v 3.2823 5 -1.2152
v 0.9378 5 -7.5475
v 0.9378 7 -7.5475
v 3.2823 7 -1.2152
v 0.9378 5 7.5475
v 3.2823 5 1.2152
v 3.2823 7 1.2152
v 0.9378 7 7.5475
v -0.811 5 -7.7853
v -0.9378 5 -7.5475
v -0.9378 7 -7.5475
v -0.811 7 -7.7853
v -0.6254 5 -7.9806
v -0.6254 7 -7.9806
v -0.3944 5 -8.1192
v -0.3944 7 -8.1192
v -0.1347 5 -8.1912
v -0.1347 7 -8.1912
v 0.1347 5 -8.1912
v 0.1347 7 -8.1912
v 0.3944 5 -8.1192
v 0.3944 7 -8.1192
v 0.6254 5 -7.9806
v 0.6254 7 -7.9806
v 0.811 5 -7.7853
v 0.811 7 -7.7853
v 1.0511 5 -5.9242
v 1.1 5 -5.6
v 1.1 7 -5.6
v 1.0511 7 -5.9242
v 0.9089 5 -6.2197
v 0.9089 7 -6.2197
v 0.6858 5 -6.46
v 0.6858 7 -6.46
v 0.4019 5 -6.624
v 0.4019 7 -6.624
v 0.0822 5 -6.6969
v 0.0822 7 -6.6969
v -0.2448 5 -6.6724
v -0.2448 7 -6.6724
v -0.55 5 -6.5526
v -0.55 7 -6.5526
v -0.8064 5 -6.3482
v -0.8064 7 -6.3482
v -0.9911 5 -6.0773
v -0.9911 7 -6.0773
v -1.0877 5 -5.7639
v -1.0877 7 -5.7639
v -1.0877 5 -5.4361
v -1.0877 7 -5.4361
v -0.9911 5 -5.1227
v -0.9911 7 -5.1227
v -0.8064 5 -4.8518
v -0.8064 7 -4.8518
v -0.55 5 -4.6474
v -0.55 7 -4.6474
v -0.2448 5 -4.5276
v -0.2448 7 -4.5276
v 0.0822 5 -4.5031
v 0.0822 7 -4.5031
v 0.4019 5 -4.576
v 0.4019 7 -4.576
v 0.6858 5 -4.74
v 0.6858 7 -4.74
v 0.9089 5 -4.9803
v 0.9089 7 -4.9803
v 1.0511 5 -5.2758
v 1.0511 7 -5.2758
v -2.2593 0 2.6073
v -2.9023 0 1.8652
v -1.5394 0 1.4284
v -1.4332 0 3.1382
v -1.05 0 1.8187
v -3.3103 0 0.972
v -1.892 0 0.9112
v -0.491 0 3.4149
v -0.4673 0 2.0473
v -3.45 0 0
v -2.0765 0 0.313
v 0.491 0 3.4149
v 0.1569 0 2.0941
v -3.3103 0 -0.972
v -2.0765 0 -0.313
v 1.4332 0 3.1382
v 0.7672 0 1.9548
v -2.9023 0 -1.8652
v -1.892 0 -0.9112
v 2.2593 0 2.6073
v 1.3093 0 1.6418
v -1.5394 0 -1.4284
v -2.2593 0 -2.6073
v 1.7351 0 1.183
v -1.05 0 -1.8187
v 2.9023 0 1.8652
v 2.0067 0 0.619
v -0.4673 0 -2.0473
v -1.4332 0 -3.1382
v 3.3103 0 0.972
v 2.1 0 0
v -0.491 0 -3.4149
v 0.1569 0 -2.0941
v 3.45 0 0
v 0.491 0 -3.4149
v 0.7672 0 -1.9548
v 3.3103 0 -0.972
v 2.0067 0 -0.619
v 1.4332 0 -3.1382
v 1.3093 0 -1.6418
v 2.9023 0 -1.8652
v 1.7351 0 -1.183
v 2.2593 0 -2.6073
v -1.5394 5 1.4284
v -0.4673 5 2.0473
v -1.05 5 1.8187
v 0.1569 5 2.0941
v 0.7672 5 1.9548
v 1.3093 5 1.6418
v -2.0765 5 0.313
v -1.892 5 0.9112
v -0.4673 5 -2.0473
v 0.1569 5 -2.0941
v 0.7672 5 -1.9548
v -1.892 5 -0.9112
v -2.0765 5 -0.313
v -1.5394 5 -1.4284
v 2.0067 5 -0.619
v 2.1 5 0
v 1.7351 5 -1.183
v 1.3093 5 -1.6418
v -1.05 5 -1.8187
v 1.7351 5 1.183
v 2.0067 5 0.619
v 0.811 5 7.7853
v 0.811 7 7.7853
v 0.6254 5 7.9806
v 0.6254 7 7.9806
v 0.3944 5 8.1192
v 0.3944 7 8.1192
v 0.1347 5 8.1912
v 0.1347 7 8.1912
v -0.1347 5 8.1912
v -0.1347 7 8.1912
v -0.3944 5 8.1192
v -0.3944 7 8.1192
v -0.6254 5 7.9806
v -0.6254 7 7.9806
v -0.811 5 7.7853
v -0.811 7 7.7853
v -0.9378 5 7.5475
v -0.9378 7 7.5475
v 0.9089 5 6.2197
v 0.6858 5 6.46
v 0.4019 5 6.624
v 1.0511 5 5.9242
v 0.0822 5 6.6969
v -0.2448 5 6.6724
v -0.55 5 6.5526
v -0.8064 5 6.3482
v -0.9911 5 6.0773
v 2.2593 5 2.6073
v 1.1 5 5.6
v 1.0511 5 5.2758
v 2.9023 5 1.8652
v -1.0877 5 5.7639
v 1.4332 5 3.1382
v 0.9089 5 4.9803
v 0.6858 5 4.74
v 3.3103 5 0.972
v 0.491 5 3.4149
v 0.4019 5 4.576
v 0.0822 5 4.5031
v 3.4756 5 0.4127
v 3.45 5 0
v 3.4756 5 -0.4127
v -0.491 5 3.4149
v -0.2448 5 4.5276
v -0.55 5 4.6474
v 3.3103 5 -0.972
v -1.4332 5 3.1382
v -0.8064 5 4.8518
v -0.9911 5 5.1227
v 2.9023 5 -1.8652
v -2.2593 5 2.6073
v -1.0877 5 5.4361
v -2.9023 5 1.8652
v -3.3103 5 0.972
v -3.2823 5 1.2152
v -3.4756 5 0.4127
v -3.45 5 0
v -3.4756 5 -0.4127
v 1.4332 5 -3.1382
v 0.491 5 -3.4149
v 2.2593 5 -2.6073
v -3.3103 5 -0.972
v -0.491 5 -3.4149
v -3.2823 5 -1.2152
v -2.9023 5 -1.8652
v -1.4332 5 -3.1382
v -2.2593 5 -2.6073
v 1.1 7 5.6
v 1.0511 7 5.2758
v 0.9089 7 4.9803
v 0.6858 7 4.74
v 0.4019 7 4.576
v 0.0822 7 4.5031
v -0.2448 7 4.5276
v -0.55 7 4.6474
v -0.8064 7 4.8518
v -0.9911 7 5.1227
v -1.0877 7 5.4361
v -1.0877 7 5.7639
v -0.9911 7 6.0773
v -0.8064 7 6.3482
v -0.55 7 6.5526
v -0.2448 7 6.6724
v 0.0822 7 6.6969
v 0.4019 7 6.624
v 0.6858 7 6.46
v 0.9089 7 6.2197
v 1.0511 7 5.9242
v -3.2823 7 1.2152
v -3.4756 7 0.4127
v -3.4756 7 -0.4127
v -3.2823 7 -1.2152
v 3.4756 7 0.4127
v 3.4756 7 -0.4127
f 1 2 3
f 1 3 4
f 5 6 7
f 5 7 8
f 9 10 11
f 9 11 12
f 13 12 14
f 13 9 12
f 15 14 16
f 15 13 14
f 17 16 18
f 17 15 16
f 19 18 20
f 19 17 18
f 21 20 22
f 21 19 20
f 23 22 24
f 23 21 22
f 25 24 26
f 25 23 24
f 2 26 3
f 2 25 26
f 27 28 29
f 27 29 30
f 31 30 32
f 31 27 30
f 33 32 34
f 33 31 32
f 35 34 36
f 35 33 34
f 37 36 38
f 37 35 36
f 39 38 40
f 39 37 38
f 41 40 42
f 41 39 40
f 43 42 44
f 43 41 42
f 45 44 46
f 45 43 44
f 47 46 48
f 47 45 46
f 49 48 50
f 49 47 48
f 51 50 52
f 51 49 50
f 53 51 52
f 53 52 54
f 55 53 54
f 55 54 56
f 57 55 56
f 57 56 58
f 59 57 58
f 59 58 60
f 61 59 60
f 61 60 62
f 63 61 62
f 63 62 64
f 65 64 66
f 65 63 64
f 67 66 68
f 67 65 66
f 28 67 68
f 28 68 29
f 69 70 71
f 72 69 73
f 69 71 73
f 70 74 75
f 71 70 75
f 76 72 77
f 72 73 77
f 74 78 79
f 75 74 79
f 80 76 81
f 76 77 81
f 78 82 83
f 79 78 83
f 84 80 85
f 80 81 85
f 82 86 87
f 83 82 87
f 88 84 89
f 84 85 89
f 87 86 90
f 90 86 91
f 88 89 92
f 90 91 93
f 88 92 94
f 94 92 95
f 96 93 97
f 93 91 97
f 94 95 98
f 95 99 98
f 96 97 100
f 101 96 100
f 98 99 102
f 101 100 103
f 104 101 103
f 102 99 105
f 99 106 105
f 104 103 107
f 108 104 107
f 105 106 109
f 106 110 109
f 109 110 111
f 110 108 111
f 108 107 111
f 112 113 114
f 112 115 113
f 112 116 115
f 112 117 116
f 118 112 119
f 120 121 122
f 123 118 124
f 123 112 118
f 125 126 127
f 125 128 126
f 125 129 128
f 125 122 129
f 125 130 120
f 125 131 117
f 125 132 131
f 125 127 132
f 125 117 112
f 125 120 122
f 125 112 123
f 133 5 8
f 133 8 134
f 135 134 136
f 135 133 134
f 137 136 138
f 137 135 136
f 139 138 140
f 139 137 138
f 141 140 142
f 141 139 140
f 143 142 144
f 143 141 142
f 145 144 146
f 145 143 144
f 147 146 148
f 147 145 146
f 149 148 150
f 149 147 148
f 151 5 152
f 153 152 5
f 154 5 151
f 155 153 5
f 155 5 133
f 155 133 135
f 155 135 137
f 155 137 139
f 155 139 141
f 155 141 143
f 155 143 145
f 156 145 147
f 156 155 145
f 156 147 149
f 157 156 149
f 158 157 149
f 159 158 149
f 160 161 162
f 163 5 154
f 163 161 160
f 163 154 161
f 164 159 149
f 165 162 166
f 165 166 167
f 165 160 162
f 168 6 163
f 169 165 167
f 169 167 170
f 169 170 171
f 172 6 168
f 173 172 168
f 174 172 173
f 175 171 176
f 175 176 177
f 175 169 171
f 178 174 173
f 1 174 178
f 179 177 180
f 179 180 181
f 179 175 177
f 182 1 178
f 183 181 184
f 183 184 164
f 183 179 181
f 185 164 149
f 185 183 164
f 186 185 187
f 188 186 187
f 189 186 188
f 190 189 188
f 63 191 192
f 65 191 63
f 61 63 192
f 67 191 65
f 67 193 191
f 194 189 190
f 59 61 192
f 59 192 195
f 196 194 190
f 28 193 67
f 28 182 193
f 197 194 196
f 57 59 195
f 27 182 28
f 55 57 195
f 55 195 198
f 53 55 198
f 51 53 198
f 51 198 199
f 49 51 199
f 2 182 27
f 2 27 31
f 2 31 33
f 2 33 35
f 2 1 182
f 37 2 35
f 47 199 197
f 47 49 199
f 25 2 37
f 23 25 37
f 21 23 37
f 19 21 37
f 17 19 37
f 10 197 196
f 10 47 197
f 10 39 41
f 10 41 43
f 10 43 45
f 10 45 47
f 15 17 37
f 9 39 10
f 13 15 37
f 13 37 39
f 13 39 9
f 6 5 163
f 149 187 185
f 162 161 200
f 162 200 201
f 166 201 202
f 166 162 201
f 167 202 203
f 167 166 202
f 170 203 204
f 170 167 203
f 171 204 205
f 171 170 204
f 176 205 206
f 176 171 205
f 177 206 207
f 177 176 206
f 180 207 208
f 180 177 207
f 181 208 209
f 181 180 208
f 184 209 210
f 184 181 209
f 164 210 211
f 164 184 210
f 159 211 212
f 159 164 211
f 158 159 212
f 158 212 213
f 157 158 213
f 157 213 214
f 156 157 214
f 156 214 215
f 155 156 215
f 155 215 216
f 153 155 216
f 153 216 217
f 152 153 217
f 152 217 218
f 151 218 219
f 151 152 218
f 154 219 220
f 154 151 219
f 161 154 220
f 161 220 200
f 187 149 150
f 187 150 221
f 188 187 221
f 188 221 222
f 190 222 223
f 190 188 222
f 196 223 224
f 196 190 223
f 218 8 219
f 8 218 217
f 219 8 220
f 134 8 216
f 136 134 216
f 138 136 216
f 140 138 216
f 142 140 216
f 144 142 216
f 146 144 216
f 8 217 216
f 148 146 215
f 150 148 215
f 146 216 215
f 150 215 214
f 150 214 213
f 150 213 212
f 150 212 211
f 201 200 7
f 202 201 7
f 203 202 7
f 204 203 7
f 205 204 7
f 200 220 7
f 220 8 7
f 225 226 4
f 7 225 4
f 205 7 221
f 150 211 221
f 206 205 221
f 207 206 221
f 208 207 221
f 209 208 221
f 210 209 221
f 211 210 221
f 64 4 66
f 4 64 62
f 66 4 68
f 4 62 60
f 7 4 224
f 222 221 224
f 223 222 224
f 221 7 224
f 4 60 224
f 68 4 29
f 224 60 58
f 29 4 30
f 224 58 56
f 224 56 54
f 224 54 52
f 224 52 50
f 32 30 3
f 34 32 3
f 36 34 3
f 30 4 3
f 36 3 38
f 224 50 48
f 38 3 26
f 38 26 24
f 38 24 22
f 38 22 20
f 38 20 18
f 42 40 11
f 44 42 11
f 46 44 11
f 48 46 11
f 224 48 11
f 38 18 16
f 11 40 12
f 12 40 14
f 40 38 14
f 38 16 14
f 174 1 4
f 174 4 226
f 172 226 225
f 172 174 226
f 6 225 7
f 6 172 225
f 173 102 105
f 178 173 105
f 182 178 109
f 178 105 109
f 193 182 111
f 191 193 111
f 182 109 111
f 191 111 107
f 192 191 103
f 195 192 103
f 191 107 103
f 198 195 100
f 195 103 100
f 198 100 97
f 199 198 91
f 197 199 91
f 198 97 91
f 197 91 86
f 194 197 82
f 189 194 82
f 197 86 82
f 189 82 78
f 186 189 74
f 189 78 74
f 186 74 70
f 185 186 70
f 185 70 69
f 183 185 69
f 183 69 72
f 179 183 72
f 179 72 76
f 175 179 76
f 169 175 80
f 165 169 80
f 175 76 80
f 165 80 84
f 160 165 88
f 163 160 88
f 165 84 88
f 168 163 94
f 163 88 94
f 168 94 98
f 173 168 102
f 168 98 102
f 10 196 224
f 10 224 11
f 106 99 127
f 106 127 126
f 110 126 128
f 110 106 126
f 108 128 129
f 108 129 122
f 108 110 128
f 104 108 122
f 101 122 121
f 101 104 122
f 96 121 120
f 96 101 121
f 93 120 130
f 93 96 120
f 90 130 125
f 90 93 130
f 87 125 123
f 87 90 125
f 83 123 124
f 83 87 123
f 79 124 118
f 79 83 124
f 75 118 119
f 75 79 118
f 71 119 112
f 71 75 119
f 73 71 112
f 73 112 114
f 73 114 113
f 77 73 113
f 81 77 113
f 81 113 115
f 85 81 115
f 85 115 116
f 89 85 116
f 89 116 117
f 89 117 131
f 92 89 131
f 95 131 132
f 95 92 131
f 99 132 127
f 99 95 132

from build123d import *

# Parameters (mm, degrees)
SKETCH1_R           = 3.45
SKETCH1_R_2         = 2.1
BOSS_EXTRUDE1_DEPTH = 5
SKETCH2_R           = 1.1
BOSS_EXTRUDE2_DEPTH = 2


with BuildPart() as part:
    # Sketch1 → Boss-Extrude1 (new body)
    with BuildSketch(Plane(origin=(0, 0, 0), x_dir=(1, 0, 0), z_dir=(0, 1, 0))):
        Circle(SKETCH1_R)
        Circle(SKETCH1_R_2, mode=Mode.SUBTRACT)
    extrude(amount=BOSS_EXTRUDE1_DEPTH)

    # Sketch2 → Boss-Extrude2 (add)
    with BuildSketch(Plane(origin=(0, 5, 0), x_dir=(1, 0, 0), z_dir=(0, 1, 0))):
        with BuildLine():
            Line((-3.282257873, 1.215229712), (-0.937787964, 7.547493269))
            ThreePointArc((-0.937787964, 7.547493269), (0, 8.200284779), (0.937787964, 7.547493269))
            Line((0.937787964, 7.547493269), (3.282257873, 1.215229712))
            ThreePointArc((3.282257873, 1.215229712), (3.5, 0), (3.282257873, -1.215229712))
            Line((3.282257873, -1.215229712), (0.937787964, -7.547493269))
            ThreePointArc((0.937787964, -7.547493269), (0, -8.200284779), (-0.937787964, -7.547493269))
            Line((-0.937787964, -7.547493269), (-3.282257873, -1.215229712))
            ThreePointArc((-3.282257873, -1.215229712), (-3.5, 0), (-3.282257873, 1.215229712))
        make_face()
        with Locations((0, -5.6)):
            Circle(SKETCH2_R, mode=Mode.SUBTRACT)
        with Locations((0, 5.6)):
            Circle(SKETCH2_R, mode=Mode.SUBTRACT)
    extrude(amount=BOSS_EXTRUDE2_DEPTH)


solid = part.part
